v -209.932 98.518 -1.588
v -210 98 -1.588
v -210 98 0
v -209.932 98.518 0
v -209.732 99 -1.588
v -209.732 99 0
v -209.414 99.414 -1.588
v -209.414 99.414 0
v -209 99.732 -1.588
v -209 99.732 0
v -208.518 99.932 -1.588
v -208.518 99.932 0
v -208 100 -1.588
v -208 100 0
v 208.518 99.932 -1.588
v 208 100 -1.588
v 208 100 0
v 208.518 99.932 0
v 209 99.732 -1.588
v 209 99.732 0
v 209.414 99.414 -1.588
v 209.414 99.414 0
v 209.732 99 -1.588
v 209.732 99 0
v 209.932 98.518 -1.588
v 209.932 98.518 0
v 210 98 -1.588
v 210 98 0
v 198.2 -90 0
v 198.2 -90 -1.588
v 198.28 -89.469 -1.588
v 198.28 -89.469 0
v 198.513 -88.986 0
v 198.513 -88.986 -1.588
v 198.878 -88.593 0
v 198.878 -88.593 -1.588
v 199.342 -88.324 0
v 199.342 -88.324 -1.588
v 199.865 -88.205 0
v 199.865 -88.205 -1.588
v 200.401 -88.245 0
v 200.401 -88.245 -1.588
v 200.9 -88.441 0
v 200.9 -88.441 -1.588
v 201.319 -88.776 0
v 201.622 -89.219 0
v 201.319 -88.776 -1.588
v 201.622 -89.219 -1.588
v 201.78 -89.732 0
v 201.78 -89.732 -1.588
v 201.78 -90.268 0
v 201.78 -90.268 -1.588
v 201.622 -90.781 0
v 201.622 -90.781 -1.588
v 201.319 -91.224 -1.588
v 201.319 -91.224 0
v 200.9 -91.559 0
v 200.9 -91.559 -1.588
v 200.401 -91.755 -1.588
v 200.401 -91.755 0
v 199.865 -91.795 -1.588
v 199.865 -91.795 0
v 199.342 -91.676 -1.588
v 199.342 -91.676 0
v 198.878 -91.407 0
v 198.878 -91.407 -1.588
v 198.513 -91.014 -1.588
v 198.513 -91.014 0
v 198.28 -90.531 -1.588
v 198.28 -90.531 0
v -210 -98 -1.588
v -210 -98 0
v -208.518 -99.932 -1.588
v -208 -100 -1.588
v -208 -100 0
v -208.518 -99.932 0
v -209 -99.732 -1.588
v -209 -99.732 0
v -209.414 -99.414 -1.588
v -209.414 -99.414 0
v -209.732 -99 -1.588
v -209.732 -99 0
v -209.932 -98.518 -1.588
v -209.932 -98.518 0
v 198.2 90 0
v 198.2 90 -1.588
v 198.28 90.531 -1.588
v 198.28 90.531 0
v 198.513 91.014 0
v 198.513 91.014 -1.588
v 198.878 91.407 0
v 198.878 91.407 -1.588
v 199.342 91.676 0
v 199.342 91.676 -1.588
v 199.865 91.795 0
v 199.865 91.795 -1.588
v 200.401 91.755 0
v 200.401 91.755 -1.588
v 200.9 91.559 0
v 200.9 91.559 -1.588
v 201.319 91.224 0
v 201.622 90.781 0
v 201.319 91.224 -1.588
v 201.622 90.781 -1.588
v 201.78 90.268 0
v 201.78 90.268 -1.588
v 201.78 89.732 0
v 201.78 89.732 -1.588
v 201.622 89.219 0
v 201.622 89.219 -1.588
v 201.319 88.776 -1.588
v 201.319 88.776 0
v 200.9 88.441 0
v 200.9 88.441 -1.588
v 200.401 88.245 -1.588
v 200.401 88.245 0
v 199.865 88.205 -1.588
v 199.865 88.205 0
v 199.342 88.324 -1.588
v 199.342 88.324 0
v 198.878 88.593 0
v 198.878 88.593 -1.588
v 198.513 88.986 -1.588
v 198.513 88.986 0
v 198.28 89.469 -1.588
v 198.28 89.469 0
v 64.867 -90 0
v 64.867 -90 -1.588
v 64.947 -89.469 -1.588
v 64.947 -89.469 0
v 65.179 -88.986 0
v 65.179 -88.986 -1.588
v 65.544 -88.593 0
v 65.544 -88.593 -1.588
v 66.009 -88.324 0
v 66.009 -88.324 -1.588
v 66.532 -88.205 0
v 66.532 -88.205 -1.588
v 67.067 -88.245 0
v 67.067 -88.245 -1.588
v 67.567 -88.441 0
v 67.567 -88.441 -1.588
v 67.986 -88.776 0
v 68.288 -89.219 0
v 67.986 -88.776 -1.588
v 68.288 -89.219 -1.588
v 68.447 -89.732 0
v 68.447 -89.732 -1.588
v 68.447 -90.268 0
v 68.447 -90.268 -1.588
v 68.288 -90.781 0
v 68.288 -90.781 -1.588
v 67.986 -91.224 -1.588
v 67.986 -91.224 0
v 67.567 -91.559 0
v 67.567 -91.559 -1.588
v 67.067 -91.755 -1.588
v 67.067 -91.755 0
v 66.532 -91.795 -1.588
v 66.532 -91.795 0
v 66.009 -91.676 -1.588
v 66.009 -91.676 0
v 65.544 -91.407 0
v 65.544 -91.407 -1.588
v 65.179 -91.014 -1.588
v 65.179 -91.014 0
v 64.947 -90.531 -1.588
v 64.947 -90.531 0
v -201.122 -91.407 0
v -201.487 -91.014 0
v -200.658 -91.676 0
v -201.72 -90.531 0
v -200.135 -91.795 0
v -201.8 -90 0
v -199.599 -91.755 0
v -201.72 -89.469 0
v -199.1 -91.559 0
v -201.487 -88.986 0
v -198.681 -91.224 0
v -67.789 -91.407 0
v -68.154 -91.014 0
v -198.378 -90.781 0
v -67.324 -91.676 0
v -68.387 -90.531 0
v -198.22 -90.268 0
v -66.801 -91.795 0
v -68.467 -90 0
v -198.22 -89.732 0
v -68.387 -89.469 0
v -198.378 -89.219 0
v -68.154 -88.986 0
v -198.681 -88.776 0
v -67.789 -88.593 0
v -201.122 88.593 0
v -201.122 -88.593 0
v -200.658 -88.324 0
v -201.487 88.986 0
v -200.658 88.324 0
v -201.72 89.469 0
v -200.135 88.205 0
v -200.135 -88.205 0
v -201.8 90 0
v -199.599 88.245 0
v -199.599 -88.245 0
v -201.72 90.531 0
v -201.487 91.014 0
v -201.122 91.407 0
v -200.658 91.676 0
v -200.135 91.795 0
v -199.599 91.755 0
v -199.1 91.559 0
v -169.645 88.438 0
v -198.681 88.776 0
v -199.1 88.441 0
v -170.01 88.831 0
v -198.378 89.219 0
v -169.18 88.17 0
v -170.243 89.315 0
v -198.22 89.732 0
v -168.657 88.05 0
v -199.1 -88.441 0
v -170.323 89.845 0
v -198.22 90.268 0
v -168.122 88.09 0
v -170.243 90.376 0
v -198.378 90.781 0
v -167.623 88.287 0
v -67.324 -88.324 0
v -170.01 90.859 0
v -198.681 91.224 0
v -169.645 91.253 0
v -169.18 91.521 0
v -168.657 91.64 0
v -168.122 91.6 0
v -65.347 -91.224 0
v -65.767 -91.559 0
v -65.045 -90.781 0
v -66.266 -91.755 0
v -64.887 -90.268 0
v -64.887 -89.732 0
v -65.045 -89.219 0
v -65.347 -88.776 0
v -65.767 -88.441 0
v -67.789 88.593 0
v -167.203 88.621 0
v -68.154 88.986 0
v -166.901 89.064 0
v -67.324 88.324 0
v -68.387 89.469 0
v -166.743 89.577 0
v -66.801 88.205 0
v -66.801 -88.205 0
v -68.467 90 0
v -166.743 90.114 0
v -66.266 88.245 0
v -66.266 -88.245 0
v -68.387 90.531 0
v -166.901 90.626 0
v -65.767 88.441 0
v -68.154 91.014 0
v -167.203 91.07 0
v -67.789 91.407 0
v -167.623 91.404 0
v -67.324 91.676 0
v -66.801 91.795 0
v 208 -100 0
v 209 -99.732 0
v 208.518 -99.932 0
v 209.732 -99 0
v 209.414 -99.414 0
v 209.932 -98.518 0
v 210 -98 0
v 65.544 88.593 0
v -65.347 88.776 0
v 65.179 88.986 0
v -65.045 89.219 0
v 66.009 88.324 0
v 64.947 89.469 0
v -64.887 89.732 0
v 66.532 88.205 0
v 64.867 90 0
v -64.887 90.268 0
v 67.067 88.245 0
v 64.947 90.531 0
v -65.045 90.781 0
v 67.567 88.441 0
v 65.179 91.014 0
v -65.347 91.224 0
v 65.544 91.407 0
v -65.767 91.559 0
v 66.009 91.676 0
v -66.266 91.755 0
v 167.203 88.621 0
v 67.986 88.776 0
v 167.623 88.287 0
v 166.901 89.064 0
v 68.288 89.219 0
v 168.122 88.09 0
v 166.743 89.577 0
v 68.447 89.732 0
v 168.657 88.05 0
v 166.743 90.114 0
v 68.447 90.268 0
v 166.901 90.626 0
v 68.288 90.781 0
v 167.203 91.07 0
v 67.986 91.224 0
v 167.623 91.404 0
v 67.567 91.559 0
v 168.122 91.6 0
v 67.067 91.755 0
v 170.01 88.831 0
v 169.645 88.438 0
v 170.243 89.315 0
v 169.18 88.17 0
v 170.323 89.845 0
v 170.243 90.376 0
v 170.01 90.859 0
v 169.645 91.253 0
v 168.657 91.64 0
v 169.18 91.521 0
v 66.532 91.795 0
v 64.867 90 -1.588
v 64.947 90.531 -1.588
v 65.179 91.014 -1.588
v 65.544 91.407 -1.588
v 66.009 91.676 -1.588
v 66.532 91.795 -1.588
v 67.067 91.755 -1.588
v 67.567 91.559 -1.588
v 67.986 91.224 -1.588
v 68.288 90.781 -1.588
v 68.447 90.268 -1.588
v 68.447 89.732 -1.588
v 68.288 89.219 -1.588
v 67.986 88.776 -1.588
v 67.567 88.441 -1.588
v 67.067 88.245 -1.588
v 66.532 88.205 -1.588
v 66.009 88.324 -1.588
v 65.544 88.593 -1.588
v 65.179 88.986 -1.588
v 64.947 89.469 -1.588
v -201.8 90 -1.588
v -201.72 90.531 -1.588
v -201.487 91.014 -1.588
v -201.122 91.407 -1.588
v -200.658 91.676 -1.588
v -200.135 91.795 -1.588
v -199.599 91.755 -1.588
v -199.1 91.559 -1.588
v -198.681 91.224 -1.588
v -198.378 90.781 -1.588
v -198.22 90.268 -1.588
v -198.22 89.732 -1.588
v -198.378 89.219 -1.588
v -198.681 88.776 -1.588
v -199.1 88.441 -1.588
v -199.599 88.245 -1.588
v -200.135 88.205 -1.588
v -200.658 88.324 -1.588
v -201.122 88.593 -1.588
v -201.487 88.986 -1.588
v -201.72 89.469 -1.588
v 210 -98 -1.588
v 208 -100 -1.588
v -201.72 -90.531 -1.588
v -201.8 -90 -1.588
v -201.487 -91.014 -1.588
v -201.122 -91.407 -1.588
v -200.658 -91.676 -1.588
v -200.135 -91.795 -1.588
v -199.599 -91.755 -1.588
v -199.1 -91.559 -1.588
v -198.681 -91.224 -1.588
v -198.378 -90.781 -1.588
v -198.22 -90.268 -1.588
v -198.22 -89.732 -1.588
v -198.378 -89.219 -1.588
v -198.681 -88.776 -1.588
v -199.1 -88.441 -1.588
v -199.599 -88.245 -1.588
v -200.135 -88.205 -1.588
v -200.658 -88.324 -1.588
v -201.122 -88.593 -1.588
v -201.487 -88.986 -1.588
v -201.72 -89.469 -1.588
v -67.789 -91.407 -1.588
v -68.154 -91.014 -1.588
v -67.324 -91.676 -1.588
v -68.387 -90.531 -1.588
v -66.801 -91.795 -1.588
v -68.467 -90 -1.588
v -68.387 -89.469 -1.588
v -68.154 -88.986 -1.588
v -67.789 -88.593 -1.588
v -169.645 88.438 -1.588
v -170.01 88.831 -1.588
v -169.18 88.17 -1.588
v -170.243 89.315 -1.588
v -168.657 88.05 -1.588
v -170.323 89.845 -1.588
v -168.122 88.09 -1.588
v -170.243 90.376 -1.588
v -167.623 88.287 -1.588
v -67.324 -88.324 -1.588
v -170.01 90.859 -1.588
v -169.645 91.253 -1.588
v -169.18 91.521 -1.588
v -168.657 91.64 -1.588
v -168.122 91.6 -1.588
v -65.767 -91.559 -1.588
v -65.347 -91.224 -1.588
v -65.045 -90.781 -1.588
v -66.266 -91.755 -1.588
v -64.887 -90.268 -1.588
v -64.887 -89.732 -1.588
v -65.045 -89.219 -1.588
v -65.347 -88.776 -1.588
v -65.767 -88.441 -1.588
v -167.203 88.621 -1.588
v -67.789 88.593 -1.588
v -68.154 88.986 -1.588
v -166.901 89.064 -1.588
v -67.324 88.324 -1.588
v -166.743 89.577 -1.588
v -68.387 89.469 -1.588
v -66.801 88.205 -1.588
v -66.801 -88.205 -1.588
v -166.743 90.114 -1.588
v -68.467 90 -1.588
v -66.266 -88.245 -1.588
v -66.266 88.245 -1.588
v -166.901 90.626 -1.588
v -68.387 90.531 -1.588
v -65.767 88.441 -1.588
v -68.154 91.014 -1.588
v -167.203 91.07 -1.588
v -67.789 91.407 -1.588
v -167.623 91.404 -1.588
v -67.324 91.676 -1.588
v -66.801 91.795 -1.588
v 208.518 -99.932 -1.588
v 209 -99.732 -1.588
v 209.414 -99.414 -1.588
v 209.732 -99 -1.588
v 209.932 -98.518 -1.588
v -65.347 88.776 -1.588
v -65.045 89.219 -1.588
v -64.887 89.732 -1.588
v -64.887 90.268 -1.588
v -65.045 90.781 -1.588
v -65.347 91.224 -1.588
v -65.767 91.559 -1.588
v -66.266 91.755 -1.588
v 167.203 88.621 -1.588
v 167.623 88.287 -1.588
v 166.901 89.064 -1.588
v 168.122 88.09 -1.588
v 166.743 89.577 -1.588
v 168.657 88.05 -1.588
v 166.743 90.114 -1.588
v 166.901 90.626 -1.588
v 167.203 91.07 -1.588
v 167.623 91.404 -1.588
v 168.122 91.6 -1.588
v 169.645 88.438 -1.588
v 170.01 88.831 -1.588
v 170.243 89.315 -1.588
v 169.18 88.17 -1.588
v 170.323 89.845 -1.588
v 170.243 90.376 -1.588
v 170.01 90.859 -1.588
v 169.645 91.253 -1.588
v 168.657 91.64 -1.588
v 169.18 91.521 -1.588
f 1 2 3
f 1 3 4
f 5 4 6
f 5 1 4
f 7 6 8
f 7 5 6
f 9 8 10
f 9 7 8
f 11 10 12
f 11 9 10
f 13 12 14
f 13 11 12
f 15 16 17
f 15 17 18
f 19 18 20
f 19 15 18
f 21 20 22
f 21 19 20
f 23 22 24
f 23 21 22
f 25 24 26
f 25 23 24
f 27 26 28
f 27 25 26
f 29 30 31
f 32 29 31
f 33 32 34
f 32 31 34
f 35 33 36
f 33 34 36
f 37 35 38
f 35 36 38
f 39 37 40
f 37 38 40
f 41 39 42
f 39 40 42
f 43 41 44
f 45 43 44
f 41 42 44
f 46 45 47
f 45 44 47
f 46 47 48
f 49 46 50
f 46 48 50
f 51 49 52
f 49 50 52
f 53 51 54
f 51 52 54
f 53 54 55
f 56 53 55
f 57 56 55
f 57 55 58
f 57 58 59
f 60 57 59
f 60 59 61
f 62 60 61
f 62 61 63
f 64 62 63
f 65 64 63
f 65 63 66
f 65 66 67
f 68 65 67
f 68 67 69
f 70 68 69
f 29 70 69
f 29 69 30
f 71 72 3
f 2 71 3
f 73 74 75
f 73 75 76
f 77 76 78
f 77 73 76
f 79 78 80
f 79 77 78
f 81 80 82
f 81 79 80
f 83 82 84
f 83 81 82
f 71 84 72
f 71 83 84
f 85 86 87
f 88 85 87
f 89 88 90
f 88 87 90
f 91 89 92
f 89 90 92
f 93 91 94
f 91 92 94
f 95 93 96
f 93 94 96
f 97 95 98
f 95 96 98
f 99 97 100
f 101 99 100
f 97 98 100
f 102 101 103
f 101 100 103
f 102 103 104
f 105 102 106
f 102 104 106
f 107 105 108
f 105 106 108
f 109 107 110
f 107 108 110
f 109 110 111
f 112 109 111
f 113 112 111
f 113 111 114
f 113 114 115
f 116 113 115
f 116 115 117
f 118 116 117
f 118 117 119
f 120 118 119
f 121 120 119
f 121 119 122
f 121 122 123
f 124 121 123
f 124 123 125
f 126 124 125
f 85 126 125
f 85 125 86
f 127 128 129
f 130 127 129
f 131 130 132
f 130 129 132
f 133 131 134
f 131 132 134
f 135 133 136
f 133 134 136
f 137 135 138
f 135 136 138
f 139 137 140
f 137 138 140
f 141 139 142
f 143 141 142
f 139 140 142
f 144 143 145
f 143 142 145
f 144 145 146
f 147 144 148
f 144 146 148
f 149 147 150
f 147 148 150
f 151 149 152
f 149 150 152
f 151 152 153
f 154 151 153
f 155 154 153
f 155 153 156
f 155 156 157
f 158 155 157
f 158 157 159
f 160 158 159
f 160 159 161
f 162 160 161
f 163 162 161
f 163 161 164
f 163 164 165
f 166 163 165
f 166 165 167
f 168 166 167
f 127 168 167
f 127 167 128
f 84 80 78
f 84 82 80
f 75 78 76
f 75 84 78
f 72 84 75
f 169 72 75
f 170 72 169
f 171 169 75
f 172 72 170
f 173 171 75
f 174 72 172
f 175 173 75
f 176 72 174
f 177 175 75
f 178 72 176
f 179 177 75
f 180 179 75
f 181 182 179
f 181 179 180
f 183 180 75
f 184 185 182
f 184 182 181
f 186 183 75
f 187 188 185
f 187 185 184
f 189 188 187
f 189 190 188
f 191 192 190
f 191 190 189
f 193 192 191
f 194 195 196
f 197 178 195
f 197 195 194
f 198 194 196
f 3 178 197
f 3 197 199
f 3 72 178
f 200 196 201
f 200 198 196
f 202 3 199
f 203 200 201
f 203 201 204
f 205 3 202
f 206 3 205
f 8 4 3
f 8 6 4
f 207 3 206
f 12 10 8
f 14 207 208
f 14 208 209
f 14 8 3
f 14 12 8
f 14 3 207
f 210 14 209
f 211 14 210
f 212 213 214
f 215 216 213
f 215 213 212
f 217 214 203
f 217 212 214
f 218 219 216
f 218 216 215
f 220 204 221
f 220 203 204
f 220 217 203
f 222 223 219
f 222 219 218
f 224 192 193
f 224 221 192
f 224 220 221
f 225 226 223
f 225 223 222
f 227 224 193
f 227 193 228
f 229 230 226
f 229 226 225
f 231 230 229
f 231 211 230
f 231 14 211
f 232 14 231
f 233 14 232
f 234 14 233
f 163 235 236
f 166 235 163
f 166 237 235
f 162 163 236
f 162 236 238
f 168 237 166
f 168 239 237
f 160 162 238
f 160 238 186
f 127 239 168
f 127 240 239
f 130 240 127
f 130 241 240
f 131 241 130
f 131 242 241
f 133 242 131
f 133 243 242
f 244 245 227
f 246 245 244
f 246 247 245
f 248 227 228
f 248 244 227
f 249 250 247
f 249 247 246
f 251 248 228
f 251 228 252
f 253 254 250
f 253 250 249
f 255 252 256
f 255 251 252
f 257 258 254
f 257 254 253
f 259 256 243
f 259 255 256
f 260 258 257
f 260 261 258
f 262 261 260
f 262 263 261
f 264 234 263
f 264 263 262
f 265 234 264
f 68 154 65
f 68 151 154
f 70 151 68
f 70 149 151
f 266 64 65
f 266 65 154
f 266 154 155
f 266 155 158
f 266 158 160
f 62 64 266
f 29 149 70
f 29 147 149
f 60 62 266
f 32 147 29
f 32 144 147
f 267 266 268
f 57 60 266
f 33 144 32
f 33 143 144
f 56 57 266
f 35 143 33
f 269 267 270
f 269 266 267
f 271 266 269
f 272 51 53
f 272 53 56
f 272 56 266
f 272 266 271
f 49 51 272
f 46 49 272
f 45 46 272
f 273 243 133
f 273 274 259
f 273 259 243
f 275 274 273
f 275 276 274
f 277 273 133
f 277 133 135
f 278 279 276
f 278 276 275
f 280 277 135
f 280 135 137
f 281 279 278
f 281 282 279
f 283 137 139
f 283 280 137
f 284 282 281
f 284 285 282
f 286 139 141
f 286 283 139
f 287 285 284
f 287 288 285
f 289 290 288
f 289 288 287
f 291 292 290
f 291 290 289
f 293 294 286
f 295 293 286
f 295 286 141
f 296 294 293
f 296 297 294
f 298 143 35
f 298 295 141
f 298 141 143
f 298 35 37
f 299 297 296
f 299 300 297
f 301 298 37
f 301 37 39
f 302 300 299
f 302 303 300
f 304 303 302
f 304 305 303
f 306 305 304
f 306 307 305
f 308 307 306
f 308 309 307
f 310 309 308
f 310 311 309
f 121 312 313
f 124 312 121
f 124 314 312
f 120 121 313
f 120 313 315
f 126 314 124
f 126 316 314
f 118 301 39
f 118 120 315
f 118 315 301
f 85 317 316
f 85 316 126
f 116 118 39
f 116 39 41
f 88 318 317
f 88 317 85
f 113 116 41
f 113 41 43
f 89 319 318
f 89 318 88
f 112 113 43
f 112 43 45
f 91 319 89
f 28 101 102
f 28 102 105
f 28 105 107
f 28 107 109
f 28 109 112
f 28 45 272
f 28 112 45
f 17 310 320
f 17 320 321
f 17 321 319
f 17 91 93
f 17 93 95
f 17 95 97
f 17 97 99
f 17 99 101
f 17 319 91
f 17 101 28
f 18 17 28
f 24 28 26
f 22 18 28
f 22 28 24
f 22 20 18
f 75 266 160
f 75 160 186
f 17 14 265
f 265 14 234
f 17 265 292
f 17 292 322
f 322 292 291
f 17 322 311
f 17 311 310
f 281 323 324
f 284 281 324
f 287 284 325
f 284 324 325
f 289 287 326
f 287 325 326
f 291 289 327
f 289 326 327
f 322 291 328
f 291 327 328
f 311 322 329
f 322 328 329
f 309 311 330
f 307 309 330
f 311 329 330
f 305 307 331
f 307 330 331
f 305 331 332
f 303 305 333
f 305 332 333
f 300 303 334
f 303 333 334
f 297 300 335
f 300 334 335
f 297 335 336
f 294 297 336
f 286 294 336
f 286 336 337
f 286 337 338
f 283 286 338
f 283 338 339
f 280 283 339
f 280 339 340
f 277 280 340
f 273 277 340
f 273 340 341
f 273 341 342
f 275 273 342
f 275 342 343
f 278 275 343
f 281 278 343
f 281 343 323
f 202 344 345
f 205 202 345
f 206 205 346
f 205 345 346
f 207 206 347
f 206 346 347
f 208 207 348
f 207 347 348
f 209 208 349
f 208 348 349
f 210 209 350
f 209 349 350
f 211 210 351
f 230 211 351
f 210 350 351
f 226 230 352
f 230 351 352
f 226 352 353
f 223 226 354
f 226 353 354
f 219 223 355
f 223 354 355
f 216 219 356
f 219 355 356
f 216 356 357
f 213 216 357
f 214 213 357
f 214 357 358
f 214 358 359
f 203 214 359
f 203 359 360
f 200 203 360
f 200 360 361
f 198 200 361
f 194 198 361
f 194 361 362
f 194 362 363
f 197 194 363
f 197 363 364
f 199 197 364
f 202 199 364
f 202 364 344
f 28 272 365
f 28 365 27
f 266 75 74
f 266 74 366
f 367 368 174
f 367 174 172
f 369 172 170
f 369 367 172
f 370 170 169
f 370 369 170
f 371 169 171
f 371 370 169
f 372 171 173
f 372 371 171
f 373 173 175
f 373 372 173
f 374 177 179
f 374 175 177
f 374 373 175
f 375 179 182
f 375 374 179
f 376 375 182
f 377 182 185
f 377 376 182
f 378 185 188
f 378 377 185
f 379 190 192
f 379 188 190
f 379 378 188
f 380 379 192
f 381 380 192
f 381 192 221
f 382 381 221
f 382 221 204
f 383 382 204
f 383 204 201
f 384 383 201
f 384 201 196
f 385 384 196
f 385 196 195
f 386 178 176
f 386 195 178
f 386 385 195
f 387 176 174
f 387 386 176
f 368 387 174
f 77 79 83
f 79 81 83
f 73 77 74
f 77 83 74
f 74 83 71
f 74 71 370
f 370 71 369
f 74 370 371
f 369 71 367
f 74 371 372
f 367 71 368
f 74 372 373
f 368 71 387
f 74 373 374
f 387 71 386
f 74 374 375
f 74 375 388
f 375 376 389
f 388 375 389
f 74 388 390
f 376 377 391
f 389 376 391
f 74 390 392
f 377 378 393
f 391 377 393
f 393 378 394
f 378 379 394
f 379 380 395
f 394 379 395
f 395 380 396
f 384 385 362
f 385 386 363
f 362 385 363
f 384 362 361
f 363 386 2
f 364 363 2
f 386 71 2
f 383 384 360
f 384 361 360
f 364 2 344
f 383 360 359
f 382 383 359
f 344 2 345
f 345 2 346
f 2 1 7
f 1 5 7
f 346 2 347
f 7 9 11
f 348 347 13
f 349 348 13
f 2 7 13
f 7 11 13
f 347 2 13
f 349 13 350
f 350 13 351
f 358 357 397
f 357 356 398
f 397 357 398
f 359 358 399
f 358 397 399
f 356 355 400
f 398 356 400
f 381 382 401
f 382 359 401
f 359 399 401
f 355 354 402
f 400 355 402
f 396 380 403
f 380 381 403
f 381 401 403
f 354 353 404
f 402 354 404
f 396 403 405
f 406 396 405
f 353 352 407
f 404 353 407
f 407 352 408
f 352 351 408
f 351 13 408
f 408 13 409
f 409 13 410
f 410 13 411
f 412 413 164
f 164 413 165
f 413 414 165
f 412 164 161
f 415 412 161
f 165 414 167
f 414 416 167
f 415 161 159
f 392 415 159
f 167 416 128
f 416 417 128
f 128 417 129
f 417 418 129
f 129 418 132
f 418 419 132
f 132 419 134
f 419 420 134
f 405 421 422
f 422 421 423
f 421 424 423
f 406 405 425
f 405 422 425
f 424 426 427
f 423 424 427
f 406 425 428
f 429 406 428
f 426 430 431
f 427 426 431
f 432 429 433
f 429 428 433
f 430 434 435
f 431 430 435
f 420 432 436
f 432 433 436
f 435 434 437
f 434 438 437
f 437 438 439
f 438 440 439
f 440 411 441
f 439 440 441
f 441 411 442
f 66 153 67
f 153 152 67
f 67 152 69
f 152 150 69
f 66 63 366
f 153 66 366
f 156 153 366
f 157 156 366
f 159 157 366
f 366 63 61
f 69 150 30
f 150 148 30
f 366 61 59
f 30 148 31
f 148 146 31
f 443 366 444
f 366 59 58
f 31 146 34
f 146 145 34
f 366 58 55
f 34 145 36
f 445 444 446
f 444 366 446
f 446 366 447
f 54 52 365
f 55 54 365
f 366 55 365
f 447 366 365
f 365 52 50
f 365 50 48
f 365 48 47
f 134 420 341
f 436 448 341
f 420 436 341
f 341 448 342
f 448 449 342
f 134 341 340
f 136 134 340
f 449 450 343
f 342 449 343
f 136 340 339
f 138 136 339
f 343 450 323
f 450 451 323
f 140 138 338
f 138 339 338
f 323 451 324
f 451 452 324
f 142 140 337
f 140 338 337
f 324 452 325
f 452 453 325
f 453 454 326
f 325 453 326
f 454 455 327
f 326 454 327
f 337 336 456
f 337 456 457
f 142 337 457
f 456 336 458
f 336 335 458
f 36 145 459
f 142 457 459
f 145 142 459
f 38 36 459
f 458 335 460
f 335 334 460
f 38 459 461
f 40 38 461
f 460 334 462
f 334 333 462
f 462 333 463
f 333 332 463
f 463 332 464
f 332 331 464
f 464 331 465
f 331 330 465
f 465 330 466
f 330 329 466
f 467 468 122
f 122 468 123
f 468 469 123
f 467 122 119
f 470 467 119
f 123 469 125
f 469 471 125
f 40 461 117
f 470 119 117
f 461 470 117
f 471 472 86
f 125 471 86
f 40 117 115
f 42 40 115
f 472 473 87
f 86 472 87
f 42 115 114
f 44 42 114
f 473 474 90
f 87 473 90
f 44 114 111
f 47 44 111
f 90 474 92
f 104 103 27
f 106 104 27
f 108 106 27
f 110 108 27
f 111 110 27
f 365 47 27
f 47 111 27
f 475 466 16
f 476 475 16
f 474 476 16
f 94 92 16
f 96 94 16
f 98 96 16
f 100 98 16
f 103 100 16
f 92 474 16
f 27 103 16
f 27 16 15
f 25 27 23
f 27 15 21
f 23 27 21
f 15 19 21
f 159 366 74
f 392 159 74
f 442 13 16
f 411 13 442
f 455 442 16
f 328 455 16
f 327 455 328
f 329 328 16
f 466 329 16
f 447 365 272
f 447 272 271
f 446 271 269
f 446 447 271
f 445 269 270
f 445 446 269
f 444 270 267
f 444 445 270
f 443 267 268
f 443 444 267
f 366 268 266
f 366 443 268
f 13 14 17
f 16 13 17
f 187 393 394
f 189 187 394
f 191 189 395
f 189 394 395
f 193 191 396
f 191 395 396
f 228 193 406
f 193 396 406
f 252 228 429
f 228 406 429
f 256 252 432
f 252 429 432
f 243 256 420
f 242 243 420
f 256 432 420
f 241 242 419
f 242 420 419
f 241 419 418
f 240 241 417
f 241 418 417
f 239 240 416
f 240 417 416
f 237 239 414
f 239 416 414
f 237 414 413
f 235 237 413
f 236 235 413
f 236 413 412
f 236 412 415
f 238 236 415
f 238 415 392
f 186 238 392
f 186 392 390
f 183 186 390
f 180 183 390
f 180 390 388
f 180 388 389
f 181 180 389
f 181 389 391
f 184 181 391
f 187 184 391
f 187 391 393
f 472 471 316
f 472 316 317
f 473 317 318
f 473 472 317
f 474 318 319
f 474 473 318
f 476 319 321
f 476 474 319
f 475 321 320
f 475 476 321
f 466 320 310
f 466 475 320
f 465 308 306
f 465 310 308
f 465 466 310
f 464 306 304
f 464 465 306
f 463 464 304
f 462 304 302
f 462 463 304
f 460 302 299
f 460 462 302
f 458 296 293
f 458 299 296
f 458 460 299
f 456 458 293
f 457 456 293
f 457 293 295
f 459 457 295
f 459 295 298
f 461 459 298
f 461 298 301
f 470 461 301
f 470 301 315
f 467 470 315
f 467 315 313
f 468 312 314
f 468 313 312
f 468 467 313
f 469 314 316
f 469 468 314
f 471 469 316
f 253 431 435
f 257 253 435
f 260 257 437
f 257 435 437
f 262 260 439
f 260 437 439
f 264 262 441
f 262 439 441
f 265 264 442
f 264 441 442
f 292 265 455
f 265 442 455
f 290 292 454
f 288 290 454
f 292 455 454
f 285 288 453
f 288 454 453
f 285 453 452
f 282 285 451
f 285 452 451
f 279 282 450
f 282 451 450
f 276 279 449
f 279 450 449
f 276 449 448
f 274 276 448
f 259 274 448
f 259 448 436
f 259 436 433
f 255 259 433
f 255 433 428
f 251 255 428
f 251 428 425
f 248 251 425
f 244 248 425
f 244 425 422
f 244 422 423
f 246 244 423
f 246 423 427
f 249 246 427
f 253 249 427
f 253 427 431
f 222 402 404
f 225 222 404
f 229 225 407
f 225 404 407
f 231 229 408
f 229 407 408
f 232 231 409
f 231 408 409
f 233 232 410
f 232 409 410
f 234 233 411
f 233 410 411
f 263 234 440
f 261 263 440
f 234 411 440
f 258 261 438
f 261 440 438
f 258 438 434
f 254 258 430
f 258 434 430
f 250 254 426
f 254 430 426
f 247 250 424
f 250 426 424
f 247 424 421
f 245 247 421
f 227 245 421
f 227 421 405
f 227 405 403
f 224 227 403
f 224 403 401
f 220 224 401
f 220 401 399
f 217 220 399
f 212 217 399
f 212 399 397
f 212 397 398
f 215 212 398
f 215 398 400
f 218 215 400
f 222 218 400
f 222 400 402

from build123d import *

# Parameters (mm, degrees)
SKETCH1_W            = 420
SKETCH1_H            = 200
BASE_FLANGE1_DEPTH   = 1.588
BREAK_CORNER1_START  = -1.588
BREAK_CORNER1_DEPTH  = 1.588
M3_CLEARANCE_HOLE1_D = 3.6
LPATTERN1_COUNT      = 4
LPATTERN1_PITCH      = 133.333333333
MIRROR1_COPY_1_D     = 3.6
MIRROR1_COPY_2_D     = 3.6
MIRROR1_COPY_3_D     = 3.6
M3_CLEARANCE_HOLE2_D = 3.6


# Read off the part's stored shape, not the designer's step: Break-Corner1
# Sheet-metal steps are written as plain solids
with BuildPart() as part:
    # Sketch1 → Base-Flange1 (new body)
    with BuildSketch(Plane.XY):
        Rectangle(SKETCH1_W, SKETCH1_H)
    extrude(amount=-BASE_FLANGE1_DEPTH)

    # Break-Corner1 outline → Break-Corner1 (cut)
    with BuildSketch(Plane.XY.offset(BREAK_CORNER1_START)):
        with BuildLine():
            ThreePointArc((-208, -100), (-209.414213562, -99.414213562), (-210, -98))
            Line((-210, -98), (-210, -100))
            Line((-210, -100), (-208, -100))
        make_face()
        with BuildLine():
            Line((-210, 100), (-210, 98))
            ThreePointArc((-210, 98), (-209.414213562, 99.414213562), (-208, 100))
            Line((-208, 100), (-210, 100))
        make_face()
        with BuildLine():
            ThreePointArc((210, -98), (209.414213562, -99.414213562), (208, -100))
            Line((208, -100), (210, -100))
            Line((210, -100), (210, -98))
        make_face()
        with BuildLine():
            Line((210, 100), (208, 100))
            ThreePointArc((208, 100), (209.414213562, 99.414213562), (210, 98))
            Line((210, 98), (210, 100))
        make_face()
    extrude(amount=BREAK_CORNER1_DEPTH, mode=Mode.SUBTRACT)

    # M3 Clearance Hole1 (through all)
    with Locations(Plane.XY):
        with Locations((-200, 90)):
            m3_clearance_hole1 = Hole(M3_CLEARANCE_HOLE1_D / 2)

    # LPattern1: M3 Clearance Hole1 ×4
    with Locations(*[(i * LPATTERN1_PITCH, 0, 0) for i in range(1, LPATTERN1_COUNT)]):
        add(m3_clearance_hole1, mode=Mode.SUBTRACT)

    # Mirror1: M3 Clearance Hole1 across plane
    add(m3_clearance_hole1.mirror(Plane.ZX), mode=Mode.SUBTRACT)

    # Mirror1 copy 1 (through all)
    with Locations(Plane(origin=(133.333333333, 0, 0), x_dir=(1, 0, 0), z_dir=(0, 0, 1))):
        with Locations((-200, -90)):
            Hole(MIRROR1_COPY_1_D / 2)

    # Mirror1 copy 2 (through all)
    with Locations(Plane(origin=(266.666666667, 0, 0), x_dir=(1, 0, 0), z_dir=(0, 0, 1))):
        with Locations((-200, -90)):
            Hole(MIRROR1_COPY_2_D / 2)

    # Mirror1 copy 3 (through all)
    with Locations(Plane(origin=(400, 0, 0), x_dir=(1, 0, 0), z_dir=(0, 0, 1))):
        with Locations((-200, -90)):
            Hole(MIRROR1_COPY_3_D / 2)

    # M3 Clearance Hole2 (through all)
    with Locations(Plane.XY):
        with Locations((-168.522812918, 89.845354769)):
            m3_clearance_hole2 = Hole(M3_CLEARANCE_HOLE2_D / 2)

    # Mirror3: M3 Clearance Hole2 across plane
    add(m3_clearance_hole2.mirror(Plane(origin=(0, 0, 0), x_dir=(0, 0, 1), z_dir=(1, 0, 0))), mode=Mode.SUBTRACT)


solid = part.part
